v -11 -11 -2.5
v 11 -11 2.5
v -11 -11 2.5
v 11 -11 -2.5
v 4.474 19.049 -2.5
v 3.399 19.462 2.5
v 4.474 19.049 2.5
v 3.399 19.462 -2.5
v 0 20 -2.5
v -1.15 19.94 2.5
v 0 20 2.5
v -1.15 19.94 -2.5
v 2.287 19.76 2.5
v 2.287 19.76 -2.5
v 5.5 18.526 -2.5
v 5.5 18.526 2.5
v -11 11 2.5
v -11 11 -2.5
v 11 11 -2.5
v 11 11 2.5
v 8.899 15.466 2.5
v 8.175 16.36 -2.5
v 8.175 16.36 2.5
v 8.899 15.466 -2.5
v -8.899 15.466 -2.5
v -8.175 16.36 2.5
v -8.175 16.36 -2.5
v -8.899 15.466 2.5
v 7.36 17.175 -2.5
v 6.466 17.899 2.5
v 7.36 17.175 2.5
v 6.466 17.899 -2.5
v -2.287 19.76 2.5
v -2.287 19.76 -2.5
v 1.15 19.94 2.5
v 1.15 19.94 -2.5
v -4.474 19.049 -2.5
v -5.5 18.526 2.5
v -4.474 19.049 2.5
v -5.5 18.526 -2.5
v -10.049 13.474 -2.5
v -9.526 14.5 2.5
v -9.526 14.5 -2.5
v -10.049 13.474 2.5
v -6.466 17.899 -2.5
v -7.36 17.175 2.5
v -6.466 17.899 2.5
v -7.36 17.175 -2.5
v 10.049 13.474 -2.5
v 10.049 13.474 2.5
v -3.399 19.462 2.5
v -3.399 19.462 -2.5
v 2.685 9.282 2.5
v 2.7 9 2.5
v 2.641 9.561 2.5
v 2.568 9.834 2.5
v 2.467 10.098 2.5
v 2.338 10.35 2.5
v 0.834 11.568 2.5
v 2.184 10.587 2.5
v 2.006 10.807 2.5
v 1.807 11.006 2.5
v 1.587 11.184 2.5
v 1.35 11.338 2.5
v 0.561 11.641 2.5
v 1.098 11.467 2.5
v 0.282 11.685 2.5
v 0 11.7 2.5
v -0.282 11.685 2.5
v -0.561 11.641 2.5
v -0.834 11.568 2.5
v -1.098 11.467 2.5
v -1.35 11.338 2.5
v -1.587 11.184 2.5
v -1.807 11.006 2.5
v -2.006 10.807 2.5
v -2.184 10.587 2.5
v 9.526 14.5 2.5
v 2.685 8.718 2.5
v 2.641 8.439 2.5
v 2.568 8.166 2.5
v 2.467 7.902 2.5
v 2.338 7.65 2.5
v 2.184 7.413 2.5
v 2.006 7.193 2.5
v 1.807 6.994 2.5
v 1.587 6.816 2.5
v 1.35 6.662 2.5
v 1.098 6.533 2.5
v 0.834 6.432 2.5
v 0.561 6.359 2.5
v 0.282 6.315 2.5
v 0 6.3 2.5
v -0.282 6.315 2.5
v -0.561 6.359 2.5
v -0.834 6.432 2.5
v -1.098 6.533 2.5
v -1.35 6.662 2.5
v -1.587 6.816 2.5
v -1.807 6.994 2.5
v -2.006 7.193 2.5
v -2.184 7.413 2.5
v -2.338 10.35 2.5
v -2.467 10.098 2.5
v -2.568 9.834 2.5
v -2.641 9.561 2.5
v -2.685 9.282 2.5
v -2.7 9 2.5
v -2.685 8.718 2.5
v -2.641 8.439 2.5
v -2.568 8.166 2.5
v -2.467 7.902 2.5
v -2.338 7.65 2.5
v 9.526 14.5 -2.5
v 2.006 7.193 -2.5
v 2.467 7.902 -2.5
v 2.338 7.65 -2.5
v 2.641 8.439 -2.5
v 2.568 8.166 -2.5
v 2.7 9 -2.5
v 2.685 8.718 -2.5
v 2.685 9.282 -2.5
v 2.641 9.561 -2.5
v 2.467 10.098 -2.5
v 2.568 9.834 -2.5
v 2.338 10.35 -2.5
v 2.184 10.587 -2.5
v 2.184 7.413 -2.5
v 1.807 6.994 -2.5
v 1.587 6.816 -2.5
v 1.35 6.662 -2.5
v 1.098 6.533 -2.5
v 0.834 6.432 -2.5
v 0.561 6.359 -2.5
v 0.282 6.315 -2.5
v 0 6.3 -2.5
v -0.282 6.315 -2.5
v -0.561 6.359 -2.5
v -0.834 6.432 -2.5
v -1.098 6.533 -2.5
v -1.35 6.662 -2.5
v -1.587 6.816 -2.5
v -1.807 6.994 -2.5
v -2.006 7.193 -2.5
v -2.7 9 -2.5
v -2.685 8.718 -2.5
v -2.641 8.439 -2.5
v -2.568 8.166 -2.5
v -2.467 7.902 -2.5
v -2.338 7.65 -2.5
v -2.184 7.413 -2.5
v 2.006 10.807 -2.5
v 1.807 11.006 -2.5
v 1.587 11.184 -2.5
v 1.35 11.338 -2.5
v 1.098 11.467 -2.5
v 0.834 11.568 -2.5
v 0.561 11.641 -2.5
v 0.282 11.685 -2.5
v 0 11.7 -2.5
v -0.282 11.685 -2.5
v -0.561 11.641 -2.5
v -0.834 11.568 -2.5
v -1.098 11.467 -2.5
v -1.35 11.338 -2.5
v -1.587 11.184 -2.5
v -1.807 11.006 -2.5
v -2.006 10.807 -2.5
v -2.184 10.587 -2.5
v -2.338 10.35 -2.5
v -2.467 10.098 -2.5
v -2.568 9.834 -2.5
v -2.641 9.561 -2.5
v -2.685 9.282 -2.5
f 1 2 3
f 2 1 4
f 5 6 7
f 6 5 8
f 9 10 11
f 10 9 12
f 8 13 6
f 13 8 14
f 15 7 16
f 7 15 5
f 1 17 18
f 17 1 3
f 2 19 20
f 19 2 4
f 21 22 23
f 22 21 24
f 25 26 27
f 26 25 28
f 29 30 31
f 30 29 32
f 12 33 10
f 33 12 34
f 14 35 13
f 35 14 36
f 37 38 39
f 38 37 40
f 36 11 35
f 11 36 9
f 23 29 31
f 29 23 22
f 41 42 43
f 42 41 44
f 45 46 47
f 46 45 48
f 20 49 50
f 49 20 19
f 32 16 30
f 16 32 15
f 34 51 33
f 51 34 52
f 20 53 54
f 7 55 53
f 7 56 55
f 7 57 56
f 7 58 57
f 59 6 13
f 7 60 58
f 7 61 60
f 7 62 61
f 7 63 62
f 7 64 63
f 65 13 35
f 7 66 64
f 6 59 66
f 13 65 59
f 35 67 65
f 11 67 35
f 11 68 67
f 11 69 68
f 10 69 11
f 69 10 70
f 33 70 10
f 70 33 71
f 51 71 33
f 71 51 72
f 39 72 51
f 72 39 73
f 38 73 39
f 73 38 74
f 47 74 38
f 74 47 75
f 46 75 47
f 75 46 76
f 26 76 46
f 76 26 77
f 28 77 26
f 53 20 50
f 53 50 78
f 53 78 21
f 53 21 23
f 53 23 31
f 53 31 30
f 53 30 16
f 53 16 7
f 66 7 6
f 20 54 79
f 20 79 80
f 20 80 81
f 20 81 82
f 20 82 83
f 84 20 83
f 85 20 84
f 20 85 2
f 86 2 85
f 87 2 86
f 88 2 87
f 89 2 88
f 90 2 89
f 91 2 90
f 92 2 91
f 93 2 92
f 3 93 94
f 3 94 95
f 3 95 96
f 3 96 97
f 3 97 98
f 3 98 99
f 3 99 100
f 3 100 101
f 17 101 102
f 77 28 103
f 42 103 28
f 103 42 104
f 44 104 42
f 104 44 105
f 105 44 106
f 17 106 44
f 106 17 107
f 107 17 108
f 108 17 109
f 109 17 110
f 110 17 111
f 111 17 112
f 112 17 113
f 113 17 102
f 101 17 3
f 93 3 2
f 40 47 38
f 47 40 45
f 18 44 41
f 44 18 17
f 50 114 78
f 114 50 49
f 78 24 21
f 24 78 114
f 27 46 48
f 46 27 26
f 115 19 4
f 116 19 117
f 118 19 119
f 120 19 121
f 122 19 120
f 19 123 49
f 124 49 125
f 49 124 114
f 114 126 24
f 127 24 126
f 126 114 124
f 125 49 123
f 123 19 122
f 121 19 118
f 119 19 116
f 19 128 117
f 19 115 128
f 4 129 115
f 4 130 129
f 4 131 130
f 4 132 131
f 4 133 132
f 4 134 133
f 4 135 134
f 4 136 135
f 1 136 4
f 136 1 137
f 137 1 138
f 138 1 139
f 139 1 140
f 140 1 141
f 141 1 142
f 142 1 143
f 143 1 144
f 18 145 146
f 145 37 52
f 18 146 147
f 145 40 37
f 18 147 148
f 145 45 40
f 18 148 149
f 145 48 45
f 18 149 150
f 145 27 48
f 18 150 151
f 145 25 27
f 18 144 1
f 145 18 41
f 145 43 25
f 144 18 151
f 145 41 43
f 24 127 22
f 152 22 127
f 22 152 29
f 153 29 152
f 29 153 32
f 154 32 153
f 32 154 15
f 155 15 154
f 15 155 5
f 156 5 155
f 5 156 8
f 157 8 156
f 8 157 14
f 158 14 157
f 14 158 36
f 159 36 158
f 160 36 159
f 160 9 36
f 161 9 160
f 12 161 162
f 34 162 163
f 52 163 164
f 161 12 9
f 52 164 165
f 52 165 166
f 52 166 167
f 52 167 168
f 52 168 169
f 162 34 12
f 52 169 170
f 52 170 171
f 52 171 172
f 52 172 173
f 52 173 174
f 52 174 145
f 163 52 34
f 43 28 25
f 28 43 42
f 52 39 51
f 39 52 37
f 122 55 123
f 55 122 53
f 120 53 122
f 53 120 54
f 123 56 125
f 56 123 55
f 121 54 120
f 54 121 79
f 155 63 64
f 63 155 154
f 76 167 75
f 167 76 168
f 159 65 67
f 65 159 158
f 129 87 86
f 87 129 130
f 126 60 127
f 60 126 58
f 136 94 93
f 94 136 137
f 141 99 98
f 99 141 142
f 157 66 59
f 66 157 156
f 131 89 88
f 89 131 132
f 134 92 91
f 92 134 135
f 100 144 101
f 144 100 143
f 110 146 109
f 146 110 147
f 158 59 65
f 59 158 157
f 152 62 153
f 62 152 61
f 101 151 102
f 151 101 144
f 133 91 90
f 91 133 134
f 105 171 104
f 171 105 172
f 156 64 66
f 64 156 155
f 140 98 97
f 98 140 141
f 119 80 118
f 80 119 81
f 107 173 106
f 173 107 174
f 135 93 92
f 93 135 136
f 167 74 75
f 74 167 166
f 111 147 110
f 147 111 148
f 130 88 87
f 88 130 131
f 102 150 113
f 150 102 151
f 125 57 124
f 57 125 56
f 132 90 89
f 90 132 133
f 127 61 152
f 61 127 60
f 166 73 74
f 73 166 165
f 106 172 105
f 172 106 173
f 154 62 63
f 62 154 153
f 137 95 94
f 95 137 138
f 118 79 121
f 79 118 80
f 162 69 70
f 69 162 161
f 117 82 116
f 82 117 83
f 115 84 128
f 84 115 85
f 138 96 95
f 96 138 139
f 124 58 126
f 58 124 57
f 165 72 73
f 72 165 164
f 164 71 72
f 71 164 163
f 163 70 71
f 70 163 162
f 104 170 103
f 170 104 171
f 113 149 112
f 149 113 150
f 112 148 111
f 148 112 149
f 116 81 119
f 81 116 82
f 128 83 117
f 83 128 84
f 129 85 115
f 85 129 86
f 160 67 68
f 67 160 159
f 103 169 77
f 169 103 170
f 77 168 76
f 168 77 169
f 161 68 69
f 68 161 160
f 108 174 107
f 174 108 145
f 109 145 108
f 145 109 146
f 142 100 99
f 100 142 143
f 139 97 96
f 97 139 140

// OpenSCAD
// Single-hole mounting tab.
$fn = 60;
eps = 0.02;
tab_w = 22;
tab_h = 40;
tab_t = 5;
hole_d = 5.4;
difference() {
    hull() {
        translate([0, 0, 0]) cube([tab_w, tab_w, tab_t], center = true);
        translate([0, tab_h / 2 - tab_w / 2, 0]) cylinder(d = tab_w, h = tab_t, center = true);
    }
    translate([0, tab_h / 2 - tab_w / 2, -tab_t / 2 - eps]) cylinder(d = hole_d, h = tab_t + 2 * eps);
}
